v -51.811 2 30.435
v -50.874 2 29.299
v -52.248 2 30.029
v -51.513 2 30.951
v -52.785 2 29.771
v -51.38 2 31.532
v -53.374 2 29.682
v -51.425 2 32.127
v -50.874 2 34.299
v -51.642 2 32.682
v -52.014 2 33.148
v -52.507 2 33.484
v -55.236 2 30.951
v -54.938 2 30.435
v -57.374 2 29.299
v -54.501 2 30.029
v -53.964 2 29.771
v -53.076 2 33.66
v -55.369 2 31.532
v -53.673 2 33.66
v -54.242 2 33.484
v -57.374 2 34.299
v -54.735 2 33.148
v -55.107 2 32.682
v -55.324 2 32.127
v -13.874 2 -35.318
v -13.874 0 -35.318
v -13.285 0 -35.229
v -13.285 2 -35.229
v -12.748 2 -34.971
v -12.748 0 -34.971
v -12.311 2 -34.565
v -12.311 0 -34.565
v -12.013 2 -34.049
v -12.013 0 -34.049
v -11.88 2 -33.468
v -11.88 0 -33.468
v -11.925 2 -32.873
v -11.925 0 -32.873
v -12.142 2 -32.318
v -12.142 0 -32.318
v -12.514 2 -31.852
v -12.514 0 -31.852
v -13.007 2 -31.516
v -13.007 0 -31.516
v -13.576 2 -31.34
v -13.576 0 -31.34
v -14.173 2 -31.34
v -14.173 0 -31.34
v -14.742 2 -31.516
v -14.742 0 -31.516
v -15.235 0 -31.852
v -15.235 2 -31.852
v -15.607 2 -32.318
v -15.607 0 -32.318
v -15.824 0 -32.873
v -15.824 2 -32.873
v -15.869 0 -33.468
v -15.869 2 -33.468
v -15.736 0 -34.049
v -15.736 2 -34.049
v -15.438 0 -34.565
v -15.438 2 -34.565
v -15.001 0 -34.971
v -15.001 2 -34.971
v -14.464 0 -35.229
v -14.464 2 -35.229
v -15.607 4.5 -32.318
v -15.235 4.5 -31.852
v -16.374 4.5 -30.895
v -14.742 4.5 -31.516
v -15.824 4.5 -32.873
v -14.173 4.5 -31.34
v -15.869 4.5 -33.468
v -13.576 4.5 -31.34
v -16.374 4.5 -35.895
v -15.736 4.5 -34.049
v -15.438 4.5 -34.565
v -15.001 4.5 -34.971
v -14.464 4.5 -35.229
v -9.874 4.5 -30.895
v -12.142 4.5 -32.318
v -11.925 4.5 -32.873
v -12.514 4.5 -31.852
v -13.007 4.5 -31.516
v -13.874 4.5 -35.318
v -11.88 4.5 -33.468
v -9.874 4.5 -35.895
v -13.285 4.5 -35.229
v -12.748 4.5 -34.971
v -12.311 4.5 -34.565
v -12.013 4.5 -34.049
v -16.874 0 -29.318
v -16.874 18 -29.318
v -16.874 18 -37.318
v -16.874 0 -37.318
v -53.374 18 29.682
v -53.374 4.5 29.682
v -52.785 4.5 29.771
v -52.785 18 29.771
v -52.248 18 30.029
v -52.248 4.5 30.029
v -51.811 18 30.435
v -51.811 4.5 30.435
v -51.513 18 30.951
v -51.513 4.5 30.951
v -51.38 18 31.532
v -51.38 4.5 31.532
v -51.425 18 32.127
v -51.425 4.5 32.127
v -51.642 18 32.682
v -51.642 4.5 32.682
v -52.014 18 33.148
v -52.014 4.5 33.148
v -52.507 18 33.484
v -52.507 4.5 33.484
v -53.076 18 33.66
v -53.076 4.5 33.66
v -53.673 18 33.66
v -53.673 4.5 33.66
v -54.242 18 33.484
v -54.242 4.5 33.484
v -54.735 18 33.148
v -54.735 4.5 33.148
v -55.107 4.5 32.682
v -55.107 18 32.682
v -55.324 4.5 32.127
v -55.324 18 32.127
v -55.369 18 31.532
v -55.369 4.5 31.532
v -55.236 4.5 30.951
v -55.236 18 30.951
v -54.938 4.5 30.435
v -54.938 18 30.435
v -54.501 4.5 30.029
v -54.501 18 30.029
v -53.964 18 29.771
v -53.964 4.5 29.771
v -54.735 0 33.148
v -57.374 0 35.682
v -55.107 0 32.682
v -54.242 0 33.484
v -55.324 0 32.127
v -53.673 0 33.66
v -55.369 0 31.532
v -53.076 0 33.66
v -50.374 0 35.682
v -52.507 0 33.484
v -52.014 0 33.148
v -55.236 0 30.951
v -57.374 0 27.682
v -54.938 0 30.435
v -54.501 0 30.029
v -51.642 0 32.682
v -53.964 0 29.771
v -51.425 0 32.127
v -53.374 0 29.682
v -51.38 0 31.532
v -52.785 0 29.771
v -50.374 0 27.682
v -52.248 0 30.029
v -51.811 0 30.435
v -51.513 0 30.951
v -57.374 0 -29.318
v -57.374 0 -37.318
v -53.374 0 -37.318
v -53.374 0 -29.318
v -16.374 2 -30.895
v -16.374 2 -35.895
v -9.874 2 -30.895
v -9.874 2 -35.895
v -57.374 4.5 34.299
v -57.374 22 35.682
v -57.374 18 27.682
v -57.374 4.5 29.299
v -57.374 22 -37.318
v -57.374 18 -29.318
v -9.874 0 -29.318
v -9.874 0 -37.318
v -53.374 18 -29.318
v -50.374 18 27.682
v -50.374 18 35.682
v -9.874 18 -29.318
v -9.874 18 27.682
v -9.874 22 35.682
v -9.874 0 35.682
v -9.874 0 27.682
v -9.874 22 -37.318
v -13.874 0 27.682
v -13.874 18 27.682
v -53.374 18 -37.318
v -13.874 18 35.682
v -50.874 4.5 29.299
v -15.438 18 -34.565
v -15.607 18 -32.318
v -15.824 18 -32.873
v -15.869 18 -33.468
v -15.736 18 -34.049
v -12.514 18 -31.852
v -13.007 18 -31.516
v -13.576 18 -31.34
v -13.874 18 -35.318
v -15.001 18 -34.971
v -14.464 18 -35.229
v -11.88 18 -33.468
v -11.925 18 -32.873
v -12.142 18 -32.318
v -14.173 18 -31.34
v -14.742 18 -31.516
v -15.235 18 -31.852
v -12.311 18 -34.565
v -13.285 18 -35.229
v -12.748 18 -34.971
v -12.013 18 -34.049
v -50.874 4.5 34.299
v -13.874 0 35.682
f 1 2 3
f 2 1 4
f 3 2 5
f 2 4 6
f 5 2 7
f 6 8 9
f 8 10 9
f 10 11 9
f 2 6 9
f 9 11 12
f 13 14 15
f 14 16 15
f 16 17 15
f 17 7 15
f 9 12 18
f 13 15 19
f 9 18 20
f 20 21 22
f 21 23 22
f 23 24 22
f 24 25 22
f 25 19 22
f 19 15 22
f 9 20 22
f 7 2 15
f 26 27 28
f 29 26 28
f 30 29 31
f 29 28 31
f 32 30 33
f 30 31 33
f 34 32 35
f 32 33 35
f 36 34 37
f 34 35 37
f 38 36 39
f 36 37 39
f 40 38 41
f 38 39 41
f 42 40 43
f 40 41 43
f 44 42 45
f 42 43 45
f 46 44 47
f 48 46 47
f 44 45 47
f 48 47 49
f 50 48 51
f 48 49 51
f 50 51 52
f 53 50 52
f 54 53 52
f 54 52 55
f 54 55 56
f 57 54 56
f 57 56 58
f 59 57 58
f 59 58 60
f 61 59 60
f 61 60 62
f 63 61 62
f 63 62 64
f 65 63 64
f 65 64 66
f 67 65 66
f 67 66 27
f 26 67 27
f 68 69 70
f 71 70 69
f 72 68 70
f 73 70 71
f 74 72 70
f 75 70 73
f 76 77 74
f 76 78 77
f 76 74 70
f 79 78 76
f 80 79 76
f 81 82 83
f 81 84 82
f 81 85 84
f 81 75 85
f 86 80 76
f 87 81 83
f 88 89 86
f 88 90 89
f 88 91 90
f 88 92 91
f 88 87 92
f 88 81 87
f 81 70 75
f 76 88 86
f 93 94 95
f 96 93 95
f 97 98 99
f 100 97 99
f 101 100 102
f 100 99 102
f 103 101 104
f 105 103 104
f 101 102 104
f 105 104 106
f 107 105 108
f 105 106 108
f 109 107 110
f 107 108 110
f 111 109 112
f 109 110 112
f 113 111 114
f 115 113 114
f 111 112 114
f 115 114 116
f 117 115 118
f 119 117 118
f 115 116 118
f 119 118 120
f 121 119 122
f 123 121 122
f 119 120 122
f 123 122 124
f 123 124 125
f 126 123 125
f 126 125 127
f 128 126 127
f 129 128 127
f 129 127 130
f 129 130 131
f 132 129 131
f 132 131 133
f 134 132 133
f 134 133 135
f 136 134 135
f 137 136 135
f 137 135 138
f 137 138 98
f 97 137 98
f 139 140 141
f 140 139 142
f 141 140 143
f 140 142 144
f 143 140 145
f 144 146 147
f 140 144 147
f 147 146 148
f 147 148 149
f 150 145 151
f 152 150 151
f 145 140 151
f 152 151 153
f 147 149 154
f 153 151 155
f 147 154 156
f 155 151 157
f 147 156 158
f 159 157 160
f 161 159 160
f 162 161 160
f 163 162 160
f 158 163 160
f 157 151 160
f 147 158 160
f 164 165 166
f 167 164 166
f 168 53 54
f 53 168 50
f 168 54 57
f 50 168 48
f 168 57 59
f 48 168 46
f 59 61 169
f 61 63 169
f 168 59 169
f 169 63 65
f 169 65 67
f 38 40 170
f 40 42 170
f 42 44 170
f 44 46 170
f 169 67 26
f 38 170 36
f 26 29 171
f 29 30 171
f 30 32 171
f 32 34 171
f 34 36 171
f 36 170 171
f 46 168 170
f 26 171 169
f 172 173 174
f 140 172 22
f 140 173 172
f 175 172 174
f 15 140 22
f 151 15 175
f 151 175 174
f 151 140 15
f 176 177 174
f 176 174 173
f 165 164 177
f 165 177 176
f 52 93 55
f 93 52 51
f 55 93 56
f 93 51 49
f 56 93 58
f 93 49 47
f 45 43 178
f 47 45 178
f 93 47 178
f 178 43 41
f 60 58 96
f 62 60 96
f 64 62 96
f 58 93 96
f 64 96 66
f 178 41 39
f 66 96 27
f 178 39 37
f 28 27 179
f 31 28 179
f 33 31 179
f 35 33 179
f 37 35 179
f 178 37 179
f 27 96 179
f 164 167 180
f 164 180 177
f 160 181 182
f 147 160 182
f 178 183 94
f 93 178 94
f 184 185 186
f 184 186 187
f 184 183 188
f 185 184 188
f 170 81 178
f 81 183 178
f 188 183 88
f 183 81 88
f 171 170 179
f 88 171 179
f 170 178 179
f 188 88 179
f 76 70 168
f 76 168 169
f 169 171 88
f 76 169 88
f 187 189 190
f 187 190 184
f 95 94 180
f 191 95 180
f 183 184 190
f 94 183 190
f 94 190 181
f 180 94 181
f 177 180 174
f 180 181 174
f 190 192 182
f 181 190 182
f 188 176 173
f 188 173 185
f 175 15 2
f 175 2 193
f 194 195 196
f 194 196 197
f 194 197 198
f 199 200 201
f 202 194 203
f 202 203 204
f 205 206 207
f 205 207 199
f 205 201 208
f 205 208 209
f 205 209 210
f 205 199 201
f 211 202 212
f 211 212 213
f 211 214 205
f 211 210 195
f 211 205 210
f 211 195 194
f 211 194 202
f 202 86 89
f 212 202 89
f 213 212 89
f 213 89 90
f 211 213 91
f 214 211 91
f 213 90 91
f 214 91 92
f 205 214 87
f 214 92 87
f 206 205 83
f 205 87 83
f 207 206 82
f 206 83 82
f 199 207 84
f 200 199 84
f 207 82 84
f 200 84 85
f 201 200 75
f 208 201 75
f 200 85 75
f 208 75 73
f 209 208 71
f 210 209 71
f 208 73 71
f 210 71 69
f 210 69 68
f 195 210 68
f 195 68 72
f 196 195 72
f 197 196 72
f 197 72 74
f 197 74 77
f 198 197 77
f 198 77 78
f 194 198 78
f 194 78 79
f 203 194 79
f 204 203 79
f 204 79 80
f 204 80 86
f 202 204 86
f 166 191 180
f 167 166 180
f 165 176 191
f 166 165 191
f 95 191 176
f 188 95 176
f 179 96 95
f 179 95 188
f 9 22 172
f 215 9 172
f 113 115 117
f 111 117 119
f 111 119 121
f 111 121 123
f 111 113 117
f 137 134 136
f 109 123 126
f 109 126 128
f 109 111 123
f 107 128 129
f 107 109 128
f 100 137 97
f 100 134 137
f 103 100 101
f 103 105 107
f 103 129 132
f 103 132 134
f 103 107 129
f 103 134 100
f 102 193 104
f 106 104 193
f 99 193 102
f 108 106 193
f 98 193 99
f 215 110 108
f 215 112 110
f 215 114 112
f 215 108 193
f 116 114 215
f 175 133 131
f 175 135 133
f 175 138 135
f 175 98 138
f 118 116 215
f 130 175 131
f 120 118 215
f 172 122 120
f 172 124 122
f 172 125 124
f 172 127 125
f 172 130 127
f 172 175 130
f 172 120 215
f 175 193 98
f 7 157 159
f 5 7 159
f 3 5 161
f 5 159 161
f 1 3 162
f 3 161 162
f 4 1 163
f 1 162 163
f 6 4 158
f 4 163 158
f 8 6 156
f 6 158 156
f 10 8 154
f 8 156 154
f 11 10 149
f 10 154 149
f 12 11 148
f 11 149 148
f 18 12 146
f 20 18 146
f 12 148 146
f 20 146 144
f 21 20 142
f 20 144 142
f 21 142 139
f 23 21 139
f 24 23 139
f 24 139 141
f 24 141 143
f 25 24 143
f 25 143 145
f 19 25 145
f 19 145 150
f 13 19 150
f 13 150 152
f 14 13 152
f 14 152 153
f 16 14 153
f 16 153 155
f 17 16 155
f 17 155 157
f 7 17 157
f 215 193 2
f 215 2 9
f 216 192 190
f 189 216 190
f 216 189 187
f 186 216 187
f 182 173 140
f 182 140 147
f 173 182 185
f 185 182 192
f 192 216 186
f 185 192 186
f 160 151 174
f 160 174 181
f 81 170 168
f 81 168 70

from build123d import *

# Parameters (mm, degrees)
SKETCH1_W           = 47.5
SKETCH1_H           = 73
BOSS_EXTRUDE1_DEPTH = 22
CUT_EXTRUDE1_DEPTH  = 18
SKETCH4_R           = 2
CUT_EXTRUDE2_DEPTH  = 18
SKETCH5_W           = 5
SKETCH5_H           = 2.5
CUT_EXTRUDE3_DEPTH  = 6.5
SKETCH9_W           = 5
SKETCH9_H           = 2.5
CUT_EXTRUDE4_DEPTH  = 6.5


with BuildPart() as part:
    # Sketch1 → Boss-Extrude1 (new body)
    with BuildSketch(Plane(origin=(0, 0, 0), x_dir=(1, 0, 0), z_dir=(0, 1, 0))):
        with Locations((-33.624481527, 0.818123821)):
            Rectangle(SKETCH1_W, SKETCH1_H)
    extrude(amount=BOSS_EXTRUDE1_DEPTH)

    # Sketch2 → Cut-Extrude1 (cut)
    with BuildSketch(Plane.XZ):
        Polygon((-57.374481527, 27.681876179), (-50.374481527, 27.681876179), (-50.374481527, 35.681876179), (-13.874481527, 35.681876179), (-13.874481527, 27.681876179), (-9.874481527, 27.681876179), (-9.874481527, -29.318123821), (-16.874481527, -29.318123821), (-16.874481527, -37.318123821), (-53.374481527, -37.318123821), (-53.374481527, -29.318123821), (-57.374481527, -29.318123821), align=None)
    extrude(amount=-CUT_EXTRUDE1_DEPTH, mode=Mode.SUBTRACT)

    # Sketch4 → Cut-Extrude2 (cut)
    with BuildSketch(Plane.XZ):
        with Locations(Location((-53.374481527, 31.681876179, 0), (0, 0, 270))):
            Circle(SKETCH4_R)
        with Locations(Location((-13.874481527, -33.318123821, 0), (0, 0, 270))):
            Circle(SKETCH4_R)
    extrude(amount=-CUT_EXTRUDE2_DEPTH, mode=Mode.SUBTRACT)

    # Sketch5 → Cut-Extrude3 (cut)
    with BuildSketch(Plane.ZY.offset(57.374481527)):
        with Locations((31.798626617, 3.25)):
            Rectangle(SKETCH5_W, SKETCH5_H)
    extrude(amount=-CUT_EXTRUDE3_DEPTH, mode=Mode.SUBTRACT)

    # Sketch9 → Cut-Extrude4 (cut)
    with BuildSketch(Plane(origin=(-9.874481527, 0, 0), x_dir=(0, 0, -1), z_dir=(1, 0, 0))):
        with Locations((33.394669179, 3.25)):
            Rectangle(SKETCH9_W, SKETCH9_H)
    extrude(amount=-CUT_EXTRUDE4_DEPTH, mode=Mode.SUBTRACT)


solid = part.part
